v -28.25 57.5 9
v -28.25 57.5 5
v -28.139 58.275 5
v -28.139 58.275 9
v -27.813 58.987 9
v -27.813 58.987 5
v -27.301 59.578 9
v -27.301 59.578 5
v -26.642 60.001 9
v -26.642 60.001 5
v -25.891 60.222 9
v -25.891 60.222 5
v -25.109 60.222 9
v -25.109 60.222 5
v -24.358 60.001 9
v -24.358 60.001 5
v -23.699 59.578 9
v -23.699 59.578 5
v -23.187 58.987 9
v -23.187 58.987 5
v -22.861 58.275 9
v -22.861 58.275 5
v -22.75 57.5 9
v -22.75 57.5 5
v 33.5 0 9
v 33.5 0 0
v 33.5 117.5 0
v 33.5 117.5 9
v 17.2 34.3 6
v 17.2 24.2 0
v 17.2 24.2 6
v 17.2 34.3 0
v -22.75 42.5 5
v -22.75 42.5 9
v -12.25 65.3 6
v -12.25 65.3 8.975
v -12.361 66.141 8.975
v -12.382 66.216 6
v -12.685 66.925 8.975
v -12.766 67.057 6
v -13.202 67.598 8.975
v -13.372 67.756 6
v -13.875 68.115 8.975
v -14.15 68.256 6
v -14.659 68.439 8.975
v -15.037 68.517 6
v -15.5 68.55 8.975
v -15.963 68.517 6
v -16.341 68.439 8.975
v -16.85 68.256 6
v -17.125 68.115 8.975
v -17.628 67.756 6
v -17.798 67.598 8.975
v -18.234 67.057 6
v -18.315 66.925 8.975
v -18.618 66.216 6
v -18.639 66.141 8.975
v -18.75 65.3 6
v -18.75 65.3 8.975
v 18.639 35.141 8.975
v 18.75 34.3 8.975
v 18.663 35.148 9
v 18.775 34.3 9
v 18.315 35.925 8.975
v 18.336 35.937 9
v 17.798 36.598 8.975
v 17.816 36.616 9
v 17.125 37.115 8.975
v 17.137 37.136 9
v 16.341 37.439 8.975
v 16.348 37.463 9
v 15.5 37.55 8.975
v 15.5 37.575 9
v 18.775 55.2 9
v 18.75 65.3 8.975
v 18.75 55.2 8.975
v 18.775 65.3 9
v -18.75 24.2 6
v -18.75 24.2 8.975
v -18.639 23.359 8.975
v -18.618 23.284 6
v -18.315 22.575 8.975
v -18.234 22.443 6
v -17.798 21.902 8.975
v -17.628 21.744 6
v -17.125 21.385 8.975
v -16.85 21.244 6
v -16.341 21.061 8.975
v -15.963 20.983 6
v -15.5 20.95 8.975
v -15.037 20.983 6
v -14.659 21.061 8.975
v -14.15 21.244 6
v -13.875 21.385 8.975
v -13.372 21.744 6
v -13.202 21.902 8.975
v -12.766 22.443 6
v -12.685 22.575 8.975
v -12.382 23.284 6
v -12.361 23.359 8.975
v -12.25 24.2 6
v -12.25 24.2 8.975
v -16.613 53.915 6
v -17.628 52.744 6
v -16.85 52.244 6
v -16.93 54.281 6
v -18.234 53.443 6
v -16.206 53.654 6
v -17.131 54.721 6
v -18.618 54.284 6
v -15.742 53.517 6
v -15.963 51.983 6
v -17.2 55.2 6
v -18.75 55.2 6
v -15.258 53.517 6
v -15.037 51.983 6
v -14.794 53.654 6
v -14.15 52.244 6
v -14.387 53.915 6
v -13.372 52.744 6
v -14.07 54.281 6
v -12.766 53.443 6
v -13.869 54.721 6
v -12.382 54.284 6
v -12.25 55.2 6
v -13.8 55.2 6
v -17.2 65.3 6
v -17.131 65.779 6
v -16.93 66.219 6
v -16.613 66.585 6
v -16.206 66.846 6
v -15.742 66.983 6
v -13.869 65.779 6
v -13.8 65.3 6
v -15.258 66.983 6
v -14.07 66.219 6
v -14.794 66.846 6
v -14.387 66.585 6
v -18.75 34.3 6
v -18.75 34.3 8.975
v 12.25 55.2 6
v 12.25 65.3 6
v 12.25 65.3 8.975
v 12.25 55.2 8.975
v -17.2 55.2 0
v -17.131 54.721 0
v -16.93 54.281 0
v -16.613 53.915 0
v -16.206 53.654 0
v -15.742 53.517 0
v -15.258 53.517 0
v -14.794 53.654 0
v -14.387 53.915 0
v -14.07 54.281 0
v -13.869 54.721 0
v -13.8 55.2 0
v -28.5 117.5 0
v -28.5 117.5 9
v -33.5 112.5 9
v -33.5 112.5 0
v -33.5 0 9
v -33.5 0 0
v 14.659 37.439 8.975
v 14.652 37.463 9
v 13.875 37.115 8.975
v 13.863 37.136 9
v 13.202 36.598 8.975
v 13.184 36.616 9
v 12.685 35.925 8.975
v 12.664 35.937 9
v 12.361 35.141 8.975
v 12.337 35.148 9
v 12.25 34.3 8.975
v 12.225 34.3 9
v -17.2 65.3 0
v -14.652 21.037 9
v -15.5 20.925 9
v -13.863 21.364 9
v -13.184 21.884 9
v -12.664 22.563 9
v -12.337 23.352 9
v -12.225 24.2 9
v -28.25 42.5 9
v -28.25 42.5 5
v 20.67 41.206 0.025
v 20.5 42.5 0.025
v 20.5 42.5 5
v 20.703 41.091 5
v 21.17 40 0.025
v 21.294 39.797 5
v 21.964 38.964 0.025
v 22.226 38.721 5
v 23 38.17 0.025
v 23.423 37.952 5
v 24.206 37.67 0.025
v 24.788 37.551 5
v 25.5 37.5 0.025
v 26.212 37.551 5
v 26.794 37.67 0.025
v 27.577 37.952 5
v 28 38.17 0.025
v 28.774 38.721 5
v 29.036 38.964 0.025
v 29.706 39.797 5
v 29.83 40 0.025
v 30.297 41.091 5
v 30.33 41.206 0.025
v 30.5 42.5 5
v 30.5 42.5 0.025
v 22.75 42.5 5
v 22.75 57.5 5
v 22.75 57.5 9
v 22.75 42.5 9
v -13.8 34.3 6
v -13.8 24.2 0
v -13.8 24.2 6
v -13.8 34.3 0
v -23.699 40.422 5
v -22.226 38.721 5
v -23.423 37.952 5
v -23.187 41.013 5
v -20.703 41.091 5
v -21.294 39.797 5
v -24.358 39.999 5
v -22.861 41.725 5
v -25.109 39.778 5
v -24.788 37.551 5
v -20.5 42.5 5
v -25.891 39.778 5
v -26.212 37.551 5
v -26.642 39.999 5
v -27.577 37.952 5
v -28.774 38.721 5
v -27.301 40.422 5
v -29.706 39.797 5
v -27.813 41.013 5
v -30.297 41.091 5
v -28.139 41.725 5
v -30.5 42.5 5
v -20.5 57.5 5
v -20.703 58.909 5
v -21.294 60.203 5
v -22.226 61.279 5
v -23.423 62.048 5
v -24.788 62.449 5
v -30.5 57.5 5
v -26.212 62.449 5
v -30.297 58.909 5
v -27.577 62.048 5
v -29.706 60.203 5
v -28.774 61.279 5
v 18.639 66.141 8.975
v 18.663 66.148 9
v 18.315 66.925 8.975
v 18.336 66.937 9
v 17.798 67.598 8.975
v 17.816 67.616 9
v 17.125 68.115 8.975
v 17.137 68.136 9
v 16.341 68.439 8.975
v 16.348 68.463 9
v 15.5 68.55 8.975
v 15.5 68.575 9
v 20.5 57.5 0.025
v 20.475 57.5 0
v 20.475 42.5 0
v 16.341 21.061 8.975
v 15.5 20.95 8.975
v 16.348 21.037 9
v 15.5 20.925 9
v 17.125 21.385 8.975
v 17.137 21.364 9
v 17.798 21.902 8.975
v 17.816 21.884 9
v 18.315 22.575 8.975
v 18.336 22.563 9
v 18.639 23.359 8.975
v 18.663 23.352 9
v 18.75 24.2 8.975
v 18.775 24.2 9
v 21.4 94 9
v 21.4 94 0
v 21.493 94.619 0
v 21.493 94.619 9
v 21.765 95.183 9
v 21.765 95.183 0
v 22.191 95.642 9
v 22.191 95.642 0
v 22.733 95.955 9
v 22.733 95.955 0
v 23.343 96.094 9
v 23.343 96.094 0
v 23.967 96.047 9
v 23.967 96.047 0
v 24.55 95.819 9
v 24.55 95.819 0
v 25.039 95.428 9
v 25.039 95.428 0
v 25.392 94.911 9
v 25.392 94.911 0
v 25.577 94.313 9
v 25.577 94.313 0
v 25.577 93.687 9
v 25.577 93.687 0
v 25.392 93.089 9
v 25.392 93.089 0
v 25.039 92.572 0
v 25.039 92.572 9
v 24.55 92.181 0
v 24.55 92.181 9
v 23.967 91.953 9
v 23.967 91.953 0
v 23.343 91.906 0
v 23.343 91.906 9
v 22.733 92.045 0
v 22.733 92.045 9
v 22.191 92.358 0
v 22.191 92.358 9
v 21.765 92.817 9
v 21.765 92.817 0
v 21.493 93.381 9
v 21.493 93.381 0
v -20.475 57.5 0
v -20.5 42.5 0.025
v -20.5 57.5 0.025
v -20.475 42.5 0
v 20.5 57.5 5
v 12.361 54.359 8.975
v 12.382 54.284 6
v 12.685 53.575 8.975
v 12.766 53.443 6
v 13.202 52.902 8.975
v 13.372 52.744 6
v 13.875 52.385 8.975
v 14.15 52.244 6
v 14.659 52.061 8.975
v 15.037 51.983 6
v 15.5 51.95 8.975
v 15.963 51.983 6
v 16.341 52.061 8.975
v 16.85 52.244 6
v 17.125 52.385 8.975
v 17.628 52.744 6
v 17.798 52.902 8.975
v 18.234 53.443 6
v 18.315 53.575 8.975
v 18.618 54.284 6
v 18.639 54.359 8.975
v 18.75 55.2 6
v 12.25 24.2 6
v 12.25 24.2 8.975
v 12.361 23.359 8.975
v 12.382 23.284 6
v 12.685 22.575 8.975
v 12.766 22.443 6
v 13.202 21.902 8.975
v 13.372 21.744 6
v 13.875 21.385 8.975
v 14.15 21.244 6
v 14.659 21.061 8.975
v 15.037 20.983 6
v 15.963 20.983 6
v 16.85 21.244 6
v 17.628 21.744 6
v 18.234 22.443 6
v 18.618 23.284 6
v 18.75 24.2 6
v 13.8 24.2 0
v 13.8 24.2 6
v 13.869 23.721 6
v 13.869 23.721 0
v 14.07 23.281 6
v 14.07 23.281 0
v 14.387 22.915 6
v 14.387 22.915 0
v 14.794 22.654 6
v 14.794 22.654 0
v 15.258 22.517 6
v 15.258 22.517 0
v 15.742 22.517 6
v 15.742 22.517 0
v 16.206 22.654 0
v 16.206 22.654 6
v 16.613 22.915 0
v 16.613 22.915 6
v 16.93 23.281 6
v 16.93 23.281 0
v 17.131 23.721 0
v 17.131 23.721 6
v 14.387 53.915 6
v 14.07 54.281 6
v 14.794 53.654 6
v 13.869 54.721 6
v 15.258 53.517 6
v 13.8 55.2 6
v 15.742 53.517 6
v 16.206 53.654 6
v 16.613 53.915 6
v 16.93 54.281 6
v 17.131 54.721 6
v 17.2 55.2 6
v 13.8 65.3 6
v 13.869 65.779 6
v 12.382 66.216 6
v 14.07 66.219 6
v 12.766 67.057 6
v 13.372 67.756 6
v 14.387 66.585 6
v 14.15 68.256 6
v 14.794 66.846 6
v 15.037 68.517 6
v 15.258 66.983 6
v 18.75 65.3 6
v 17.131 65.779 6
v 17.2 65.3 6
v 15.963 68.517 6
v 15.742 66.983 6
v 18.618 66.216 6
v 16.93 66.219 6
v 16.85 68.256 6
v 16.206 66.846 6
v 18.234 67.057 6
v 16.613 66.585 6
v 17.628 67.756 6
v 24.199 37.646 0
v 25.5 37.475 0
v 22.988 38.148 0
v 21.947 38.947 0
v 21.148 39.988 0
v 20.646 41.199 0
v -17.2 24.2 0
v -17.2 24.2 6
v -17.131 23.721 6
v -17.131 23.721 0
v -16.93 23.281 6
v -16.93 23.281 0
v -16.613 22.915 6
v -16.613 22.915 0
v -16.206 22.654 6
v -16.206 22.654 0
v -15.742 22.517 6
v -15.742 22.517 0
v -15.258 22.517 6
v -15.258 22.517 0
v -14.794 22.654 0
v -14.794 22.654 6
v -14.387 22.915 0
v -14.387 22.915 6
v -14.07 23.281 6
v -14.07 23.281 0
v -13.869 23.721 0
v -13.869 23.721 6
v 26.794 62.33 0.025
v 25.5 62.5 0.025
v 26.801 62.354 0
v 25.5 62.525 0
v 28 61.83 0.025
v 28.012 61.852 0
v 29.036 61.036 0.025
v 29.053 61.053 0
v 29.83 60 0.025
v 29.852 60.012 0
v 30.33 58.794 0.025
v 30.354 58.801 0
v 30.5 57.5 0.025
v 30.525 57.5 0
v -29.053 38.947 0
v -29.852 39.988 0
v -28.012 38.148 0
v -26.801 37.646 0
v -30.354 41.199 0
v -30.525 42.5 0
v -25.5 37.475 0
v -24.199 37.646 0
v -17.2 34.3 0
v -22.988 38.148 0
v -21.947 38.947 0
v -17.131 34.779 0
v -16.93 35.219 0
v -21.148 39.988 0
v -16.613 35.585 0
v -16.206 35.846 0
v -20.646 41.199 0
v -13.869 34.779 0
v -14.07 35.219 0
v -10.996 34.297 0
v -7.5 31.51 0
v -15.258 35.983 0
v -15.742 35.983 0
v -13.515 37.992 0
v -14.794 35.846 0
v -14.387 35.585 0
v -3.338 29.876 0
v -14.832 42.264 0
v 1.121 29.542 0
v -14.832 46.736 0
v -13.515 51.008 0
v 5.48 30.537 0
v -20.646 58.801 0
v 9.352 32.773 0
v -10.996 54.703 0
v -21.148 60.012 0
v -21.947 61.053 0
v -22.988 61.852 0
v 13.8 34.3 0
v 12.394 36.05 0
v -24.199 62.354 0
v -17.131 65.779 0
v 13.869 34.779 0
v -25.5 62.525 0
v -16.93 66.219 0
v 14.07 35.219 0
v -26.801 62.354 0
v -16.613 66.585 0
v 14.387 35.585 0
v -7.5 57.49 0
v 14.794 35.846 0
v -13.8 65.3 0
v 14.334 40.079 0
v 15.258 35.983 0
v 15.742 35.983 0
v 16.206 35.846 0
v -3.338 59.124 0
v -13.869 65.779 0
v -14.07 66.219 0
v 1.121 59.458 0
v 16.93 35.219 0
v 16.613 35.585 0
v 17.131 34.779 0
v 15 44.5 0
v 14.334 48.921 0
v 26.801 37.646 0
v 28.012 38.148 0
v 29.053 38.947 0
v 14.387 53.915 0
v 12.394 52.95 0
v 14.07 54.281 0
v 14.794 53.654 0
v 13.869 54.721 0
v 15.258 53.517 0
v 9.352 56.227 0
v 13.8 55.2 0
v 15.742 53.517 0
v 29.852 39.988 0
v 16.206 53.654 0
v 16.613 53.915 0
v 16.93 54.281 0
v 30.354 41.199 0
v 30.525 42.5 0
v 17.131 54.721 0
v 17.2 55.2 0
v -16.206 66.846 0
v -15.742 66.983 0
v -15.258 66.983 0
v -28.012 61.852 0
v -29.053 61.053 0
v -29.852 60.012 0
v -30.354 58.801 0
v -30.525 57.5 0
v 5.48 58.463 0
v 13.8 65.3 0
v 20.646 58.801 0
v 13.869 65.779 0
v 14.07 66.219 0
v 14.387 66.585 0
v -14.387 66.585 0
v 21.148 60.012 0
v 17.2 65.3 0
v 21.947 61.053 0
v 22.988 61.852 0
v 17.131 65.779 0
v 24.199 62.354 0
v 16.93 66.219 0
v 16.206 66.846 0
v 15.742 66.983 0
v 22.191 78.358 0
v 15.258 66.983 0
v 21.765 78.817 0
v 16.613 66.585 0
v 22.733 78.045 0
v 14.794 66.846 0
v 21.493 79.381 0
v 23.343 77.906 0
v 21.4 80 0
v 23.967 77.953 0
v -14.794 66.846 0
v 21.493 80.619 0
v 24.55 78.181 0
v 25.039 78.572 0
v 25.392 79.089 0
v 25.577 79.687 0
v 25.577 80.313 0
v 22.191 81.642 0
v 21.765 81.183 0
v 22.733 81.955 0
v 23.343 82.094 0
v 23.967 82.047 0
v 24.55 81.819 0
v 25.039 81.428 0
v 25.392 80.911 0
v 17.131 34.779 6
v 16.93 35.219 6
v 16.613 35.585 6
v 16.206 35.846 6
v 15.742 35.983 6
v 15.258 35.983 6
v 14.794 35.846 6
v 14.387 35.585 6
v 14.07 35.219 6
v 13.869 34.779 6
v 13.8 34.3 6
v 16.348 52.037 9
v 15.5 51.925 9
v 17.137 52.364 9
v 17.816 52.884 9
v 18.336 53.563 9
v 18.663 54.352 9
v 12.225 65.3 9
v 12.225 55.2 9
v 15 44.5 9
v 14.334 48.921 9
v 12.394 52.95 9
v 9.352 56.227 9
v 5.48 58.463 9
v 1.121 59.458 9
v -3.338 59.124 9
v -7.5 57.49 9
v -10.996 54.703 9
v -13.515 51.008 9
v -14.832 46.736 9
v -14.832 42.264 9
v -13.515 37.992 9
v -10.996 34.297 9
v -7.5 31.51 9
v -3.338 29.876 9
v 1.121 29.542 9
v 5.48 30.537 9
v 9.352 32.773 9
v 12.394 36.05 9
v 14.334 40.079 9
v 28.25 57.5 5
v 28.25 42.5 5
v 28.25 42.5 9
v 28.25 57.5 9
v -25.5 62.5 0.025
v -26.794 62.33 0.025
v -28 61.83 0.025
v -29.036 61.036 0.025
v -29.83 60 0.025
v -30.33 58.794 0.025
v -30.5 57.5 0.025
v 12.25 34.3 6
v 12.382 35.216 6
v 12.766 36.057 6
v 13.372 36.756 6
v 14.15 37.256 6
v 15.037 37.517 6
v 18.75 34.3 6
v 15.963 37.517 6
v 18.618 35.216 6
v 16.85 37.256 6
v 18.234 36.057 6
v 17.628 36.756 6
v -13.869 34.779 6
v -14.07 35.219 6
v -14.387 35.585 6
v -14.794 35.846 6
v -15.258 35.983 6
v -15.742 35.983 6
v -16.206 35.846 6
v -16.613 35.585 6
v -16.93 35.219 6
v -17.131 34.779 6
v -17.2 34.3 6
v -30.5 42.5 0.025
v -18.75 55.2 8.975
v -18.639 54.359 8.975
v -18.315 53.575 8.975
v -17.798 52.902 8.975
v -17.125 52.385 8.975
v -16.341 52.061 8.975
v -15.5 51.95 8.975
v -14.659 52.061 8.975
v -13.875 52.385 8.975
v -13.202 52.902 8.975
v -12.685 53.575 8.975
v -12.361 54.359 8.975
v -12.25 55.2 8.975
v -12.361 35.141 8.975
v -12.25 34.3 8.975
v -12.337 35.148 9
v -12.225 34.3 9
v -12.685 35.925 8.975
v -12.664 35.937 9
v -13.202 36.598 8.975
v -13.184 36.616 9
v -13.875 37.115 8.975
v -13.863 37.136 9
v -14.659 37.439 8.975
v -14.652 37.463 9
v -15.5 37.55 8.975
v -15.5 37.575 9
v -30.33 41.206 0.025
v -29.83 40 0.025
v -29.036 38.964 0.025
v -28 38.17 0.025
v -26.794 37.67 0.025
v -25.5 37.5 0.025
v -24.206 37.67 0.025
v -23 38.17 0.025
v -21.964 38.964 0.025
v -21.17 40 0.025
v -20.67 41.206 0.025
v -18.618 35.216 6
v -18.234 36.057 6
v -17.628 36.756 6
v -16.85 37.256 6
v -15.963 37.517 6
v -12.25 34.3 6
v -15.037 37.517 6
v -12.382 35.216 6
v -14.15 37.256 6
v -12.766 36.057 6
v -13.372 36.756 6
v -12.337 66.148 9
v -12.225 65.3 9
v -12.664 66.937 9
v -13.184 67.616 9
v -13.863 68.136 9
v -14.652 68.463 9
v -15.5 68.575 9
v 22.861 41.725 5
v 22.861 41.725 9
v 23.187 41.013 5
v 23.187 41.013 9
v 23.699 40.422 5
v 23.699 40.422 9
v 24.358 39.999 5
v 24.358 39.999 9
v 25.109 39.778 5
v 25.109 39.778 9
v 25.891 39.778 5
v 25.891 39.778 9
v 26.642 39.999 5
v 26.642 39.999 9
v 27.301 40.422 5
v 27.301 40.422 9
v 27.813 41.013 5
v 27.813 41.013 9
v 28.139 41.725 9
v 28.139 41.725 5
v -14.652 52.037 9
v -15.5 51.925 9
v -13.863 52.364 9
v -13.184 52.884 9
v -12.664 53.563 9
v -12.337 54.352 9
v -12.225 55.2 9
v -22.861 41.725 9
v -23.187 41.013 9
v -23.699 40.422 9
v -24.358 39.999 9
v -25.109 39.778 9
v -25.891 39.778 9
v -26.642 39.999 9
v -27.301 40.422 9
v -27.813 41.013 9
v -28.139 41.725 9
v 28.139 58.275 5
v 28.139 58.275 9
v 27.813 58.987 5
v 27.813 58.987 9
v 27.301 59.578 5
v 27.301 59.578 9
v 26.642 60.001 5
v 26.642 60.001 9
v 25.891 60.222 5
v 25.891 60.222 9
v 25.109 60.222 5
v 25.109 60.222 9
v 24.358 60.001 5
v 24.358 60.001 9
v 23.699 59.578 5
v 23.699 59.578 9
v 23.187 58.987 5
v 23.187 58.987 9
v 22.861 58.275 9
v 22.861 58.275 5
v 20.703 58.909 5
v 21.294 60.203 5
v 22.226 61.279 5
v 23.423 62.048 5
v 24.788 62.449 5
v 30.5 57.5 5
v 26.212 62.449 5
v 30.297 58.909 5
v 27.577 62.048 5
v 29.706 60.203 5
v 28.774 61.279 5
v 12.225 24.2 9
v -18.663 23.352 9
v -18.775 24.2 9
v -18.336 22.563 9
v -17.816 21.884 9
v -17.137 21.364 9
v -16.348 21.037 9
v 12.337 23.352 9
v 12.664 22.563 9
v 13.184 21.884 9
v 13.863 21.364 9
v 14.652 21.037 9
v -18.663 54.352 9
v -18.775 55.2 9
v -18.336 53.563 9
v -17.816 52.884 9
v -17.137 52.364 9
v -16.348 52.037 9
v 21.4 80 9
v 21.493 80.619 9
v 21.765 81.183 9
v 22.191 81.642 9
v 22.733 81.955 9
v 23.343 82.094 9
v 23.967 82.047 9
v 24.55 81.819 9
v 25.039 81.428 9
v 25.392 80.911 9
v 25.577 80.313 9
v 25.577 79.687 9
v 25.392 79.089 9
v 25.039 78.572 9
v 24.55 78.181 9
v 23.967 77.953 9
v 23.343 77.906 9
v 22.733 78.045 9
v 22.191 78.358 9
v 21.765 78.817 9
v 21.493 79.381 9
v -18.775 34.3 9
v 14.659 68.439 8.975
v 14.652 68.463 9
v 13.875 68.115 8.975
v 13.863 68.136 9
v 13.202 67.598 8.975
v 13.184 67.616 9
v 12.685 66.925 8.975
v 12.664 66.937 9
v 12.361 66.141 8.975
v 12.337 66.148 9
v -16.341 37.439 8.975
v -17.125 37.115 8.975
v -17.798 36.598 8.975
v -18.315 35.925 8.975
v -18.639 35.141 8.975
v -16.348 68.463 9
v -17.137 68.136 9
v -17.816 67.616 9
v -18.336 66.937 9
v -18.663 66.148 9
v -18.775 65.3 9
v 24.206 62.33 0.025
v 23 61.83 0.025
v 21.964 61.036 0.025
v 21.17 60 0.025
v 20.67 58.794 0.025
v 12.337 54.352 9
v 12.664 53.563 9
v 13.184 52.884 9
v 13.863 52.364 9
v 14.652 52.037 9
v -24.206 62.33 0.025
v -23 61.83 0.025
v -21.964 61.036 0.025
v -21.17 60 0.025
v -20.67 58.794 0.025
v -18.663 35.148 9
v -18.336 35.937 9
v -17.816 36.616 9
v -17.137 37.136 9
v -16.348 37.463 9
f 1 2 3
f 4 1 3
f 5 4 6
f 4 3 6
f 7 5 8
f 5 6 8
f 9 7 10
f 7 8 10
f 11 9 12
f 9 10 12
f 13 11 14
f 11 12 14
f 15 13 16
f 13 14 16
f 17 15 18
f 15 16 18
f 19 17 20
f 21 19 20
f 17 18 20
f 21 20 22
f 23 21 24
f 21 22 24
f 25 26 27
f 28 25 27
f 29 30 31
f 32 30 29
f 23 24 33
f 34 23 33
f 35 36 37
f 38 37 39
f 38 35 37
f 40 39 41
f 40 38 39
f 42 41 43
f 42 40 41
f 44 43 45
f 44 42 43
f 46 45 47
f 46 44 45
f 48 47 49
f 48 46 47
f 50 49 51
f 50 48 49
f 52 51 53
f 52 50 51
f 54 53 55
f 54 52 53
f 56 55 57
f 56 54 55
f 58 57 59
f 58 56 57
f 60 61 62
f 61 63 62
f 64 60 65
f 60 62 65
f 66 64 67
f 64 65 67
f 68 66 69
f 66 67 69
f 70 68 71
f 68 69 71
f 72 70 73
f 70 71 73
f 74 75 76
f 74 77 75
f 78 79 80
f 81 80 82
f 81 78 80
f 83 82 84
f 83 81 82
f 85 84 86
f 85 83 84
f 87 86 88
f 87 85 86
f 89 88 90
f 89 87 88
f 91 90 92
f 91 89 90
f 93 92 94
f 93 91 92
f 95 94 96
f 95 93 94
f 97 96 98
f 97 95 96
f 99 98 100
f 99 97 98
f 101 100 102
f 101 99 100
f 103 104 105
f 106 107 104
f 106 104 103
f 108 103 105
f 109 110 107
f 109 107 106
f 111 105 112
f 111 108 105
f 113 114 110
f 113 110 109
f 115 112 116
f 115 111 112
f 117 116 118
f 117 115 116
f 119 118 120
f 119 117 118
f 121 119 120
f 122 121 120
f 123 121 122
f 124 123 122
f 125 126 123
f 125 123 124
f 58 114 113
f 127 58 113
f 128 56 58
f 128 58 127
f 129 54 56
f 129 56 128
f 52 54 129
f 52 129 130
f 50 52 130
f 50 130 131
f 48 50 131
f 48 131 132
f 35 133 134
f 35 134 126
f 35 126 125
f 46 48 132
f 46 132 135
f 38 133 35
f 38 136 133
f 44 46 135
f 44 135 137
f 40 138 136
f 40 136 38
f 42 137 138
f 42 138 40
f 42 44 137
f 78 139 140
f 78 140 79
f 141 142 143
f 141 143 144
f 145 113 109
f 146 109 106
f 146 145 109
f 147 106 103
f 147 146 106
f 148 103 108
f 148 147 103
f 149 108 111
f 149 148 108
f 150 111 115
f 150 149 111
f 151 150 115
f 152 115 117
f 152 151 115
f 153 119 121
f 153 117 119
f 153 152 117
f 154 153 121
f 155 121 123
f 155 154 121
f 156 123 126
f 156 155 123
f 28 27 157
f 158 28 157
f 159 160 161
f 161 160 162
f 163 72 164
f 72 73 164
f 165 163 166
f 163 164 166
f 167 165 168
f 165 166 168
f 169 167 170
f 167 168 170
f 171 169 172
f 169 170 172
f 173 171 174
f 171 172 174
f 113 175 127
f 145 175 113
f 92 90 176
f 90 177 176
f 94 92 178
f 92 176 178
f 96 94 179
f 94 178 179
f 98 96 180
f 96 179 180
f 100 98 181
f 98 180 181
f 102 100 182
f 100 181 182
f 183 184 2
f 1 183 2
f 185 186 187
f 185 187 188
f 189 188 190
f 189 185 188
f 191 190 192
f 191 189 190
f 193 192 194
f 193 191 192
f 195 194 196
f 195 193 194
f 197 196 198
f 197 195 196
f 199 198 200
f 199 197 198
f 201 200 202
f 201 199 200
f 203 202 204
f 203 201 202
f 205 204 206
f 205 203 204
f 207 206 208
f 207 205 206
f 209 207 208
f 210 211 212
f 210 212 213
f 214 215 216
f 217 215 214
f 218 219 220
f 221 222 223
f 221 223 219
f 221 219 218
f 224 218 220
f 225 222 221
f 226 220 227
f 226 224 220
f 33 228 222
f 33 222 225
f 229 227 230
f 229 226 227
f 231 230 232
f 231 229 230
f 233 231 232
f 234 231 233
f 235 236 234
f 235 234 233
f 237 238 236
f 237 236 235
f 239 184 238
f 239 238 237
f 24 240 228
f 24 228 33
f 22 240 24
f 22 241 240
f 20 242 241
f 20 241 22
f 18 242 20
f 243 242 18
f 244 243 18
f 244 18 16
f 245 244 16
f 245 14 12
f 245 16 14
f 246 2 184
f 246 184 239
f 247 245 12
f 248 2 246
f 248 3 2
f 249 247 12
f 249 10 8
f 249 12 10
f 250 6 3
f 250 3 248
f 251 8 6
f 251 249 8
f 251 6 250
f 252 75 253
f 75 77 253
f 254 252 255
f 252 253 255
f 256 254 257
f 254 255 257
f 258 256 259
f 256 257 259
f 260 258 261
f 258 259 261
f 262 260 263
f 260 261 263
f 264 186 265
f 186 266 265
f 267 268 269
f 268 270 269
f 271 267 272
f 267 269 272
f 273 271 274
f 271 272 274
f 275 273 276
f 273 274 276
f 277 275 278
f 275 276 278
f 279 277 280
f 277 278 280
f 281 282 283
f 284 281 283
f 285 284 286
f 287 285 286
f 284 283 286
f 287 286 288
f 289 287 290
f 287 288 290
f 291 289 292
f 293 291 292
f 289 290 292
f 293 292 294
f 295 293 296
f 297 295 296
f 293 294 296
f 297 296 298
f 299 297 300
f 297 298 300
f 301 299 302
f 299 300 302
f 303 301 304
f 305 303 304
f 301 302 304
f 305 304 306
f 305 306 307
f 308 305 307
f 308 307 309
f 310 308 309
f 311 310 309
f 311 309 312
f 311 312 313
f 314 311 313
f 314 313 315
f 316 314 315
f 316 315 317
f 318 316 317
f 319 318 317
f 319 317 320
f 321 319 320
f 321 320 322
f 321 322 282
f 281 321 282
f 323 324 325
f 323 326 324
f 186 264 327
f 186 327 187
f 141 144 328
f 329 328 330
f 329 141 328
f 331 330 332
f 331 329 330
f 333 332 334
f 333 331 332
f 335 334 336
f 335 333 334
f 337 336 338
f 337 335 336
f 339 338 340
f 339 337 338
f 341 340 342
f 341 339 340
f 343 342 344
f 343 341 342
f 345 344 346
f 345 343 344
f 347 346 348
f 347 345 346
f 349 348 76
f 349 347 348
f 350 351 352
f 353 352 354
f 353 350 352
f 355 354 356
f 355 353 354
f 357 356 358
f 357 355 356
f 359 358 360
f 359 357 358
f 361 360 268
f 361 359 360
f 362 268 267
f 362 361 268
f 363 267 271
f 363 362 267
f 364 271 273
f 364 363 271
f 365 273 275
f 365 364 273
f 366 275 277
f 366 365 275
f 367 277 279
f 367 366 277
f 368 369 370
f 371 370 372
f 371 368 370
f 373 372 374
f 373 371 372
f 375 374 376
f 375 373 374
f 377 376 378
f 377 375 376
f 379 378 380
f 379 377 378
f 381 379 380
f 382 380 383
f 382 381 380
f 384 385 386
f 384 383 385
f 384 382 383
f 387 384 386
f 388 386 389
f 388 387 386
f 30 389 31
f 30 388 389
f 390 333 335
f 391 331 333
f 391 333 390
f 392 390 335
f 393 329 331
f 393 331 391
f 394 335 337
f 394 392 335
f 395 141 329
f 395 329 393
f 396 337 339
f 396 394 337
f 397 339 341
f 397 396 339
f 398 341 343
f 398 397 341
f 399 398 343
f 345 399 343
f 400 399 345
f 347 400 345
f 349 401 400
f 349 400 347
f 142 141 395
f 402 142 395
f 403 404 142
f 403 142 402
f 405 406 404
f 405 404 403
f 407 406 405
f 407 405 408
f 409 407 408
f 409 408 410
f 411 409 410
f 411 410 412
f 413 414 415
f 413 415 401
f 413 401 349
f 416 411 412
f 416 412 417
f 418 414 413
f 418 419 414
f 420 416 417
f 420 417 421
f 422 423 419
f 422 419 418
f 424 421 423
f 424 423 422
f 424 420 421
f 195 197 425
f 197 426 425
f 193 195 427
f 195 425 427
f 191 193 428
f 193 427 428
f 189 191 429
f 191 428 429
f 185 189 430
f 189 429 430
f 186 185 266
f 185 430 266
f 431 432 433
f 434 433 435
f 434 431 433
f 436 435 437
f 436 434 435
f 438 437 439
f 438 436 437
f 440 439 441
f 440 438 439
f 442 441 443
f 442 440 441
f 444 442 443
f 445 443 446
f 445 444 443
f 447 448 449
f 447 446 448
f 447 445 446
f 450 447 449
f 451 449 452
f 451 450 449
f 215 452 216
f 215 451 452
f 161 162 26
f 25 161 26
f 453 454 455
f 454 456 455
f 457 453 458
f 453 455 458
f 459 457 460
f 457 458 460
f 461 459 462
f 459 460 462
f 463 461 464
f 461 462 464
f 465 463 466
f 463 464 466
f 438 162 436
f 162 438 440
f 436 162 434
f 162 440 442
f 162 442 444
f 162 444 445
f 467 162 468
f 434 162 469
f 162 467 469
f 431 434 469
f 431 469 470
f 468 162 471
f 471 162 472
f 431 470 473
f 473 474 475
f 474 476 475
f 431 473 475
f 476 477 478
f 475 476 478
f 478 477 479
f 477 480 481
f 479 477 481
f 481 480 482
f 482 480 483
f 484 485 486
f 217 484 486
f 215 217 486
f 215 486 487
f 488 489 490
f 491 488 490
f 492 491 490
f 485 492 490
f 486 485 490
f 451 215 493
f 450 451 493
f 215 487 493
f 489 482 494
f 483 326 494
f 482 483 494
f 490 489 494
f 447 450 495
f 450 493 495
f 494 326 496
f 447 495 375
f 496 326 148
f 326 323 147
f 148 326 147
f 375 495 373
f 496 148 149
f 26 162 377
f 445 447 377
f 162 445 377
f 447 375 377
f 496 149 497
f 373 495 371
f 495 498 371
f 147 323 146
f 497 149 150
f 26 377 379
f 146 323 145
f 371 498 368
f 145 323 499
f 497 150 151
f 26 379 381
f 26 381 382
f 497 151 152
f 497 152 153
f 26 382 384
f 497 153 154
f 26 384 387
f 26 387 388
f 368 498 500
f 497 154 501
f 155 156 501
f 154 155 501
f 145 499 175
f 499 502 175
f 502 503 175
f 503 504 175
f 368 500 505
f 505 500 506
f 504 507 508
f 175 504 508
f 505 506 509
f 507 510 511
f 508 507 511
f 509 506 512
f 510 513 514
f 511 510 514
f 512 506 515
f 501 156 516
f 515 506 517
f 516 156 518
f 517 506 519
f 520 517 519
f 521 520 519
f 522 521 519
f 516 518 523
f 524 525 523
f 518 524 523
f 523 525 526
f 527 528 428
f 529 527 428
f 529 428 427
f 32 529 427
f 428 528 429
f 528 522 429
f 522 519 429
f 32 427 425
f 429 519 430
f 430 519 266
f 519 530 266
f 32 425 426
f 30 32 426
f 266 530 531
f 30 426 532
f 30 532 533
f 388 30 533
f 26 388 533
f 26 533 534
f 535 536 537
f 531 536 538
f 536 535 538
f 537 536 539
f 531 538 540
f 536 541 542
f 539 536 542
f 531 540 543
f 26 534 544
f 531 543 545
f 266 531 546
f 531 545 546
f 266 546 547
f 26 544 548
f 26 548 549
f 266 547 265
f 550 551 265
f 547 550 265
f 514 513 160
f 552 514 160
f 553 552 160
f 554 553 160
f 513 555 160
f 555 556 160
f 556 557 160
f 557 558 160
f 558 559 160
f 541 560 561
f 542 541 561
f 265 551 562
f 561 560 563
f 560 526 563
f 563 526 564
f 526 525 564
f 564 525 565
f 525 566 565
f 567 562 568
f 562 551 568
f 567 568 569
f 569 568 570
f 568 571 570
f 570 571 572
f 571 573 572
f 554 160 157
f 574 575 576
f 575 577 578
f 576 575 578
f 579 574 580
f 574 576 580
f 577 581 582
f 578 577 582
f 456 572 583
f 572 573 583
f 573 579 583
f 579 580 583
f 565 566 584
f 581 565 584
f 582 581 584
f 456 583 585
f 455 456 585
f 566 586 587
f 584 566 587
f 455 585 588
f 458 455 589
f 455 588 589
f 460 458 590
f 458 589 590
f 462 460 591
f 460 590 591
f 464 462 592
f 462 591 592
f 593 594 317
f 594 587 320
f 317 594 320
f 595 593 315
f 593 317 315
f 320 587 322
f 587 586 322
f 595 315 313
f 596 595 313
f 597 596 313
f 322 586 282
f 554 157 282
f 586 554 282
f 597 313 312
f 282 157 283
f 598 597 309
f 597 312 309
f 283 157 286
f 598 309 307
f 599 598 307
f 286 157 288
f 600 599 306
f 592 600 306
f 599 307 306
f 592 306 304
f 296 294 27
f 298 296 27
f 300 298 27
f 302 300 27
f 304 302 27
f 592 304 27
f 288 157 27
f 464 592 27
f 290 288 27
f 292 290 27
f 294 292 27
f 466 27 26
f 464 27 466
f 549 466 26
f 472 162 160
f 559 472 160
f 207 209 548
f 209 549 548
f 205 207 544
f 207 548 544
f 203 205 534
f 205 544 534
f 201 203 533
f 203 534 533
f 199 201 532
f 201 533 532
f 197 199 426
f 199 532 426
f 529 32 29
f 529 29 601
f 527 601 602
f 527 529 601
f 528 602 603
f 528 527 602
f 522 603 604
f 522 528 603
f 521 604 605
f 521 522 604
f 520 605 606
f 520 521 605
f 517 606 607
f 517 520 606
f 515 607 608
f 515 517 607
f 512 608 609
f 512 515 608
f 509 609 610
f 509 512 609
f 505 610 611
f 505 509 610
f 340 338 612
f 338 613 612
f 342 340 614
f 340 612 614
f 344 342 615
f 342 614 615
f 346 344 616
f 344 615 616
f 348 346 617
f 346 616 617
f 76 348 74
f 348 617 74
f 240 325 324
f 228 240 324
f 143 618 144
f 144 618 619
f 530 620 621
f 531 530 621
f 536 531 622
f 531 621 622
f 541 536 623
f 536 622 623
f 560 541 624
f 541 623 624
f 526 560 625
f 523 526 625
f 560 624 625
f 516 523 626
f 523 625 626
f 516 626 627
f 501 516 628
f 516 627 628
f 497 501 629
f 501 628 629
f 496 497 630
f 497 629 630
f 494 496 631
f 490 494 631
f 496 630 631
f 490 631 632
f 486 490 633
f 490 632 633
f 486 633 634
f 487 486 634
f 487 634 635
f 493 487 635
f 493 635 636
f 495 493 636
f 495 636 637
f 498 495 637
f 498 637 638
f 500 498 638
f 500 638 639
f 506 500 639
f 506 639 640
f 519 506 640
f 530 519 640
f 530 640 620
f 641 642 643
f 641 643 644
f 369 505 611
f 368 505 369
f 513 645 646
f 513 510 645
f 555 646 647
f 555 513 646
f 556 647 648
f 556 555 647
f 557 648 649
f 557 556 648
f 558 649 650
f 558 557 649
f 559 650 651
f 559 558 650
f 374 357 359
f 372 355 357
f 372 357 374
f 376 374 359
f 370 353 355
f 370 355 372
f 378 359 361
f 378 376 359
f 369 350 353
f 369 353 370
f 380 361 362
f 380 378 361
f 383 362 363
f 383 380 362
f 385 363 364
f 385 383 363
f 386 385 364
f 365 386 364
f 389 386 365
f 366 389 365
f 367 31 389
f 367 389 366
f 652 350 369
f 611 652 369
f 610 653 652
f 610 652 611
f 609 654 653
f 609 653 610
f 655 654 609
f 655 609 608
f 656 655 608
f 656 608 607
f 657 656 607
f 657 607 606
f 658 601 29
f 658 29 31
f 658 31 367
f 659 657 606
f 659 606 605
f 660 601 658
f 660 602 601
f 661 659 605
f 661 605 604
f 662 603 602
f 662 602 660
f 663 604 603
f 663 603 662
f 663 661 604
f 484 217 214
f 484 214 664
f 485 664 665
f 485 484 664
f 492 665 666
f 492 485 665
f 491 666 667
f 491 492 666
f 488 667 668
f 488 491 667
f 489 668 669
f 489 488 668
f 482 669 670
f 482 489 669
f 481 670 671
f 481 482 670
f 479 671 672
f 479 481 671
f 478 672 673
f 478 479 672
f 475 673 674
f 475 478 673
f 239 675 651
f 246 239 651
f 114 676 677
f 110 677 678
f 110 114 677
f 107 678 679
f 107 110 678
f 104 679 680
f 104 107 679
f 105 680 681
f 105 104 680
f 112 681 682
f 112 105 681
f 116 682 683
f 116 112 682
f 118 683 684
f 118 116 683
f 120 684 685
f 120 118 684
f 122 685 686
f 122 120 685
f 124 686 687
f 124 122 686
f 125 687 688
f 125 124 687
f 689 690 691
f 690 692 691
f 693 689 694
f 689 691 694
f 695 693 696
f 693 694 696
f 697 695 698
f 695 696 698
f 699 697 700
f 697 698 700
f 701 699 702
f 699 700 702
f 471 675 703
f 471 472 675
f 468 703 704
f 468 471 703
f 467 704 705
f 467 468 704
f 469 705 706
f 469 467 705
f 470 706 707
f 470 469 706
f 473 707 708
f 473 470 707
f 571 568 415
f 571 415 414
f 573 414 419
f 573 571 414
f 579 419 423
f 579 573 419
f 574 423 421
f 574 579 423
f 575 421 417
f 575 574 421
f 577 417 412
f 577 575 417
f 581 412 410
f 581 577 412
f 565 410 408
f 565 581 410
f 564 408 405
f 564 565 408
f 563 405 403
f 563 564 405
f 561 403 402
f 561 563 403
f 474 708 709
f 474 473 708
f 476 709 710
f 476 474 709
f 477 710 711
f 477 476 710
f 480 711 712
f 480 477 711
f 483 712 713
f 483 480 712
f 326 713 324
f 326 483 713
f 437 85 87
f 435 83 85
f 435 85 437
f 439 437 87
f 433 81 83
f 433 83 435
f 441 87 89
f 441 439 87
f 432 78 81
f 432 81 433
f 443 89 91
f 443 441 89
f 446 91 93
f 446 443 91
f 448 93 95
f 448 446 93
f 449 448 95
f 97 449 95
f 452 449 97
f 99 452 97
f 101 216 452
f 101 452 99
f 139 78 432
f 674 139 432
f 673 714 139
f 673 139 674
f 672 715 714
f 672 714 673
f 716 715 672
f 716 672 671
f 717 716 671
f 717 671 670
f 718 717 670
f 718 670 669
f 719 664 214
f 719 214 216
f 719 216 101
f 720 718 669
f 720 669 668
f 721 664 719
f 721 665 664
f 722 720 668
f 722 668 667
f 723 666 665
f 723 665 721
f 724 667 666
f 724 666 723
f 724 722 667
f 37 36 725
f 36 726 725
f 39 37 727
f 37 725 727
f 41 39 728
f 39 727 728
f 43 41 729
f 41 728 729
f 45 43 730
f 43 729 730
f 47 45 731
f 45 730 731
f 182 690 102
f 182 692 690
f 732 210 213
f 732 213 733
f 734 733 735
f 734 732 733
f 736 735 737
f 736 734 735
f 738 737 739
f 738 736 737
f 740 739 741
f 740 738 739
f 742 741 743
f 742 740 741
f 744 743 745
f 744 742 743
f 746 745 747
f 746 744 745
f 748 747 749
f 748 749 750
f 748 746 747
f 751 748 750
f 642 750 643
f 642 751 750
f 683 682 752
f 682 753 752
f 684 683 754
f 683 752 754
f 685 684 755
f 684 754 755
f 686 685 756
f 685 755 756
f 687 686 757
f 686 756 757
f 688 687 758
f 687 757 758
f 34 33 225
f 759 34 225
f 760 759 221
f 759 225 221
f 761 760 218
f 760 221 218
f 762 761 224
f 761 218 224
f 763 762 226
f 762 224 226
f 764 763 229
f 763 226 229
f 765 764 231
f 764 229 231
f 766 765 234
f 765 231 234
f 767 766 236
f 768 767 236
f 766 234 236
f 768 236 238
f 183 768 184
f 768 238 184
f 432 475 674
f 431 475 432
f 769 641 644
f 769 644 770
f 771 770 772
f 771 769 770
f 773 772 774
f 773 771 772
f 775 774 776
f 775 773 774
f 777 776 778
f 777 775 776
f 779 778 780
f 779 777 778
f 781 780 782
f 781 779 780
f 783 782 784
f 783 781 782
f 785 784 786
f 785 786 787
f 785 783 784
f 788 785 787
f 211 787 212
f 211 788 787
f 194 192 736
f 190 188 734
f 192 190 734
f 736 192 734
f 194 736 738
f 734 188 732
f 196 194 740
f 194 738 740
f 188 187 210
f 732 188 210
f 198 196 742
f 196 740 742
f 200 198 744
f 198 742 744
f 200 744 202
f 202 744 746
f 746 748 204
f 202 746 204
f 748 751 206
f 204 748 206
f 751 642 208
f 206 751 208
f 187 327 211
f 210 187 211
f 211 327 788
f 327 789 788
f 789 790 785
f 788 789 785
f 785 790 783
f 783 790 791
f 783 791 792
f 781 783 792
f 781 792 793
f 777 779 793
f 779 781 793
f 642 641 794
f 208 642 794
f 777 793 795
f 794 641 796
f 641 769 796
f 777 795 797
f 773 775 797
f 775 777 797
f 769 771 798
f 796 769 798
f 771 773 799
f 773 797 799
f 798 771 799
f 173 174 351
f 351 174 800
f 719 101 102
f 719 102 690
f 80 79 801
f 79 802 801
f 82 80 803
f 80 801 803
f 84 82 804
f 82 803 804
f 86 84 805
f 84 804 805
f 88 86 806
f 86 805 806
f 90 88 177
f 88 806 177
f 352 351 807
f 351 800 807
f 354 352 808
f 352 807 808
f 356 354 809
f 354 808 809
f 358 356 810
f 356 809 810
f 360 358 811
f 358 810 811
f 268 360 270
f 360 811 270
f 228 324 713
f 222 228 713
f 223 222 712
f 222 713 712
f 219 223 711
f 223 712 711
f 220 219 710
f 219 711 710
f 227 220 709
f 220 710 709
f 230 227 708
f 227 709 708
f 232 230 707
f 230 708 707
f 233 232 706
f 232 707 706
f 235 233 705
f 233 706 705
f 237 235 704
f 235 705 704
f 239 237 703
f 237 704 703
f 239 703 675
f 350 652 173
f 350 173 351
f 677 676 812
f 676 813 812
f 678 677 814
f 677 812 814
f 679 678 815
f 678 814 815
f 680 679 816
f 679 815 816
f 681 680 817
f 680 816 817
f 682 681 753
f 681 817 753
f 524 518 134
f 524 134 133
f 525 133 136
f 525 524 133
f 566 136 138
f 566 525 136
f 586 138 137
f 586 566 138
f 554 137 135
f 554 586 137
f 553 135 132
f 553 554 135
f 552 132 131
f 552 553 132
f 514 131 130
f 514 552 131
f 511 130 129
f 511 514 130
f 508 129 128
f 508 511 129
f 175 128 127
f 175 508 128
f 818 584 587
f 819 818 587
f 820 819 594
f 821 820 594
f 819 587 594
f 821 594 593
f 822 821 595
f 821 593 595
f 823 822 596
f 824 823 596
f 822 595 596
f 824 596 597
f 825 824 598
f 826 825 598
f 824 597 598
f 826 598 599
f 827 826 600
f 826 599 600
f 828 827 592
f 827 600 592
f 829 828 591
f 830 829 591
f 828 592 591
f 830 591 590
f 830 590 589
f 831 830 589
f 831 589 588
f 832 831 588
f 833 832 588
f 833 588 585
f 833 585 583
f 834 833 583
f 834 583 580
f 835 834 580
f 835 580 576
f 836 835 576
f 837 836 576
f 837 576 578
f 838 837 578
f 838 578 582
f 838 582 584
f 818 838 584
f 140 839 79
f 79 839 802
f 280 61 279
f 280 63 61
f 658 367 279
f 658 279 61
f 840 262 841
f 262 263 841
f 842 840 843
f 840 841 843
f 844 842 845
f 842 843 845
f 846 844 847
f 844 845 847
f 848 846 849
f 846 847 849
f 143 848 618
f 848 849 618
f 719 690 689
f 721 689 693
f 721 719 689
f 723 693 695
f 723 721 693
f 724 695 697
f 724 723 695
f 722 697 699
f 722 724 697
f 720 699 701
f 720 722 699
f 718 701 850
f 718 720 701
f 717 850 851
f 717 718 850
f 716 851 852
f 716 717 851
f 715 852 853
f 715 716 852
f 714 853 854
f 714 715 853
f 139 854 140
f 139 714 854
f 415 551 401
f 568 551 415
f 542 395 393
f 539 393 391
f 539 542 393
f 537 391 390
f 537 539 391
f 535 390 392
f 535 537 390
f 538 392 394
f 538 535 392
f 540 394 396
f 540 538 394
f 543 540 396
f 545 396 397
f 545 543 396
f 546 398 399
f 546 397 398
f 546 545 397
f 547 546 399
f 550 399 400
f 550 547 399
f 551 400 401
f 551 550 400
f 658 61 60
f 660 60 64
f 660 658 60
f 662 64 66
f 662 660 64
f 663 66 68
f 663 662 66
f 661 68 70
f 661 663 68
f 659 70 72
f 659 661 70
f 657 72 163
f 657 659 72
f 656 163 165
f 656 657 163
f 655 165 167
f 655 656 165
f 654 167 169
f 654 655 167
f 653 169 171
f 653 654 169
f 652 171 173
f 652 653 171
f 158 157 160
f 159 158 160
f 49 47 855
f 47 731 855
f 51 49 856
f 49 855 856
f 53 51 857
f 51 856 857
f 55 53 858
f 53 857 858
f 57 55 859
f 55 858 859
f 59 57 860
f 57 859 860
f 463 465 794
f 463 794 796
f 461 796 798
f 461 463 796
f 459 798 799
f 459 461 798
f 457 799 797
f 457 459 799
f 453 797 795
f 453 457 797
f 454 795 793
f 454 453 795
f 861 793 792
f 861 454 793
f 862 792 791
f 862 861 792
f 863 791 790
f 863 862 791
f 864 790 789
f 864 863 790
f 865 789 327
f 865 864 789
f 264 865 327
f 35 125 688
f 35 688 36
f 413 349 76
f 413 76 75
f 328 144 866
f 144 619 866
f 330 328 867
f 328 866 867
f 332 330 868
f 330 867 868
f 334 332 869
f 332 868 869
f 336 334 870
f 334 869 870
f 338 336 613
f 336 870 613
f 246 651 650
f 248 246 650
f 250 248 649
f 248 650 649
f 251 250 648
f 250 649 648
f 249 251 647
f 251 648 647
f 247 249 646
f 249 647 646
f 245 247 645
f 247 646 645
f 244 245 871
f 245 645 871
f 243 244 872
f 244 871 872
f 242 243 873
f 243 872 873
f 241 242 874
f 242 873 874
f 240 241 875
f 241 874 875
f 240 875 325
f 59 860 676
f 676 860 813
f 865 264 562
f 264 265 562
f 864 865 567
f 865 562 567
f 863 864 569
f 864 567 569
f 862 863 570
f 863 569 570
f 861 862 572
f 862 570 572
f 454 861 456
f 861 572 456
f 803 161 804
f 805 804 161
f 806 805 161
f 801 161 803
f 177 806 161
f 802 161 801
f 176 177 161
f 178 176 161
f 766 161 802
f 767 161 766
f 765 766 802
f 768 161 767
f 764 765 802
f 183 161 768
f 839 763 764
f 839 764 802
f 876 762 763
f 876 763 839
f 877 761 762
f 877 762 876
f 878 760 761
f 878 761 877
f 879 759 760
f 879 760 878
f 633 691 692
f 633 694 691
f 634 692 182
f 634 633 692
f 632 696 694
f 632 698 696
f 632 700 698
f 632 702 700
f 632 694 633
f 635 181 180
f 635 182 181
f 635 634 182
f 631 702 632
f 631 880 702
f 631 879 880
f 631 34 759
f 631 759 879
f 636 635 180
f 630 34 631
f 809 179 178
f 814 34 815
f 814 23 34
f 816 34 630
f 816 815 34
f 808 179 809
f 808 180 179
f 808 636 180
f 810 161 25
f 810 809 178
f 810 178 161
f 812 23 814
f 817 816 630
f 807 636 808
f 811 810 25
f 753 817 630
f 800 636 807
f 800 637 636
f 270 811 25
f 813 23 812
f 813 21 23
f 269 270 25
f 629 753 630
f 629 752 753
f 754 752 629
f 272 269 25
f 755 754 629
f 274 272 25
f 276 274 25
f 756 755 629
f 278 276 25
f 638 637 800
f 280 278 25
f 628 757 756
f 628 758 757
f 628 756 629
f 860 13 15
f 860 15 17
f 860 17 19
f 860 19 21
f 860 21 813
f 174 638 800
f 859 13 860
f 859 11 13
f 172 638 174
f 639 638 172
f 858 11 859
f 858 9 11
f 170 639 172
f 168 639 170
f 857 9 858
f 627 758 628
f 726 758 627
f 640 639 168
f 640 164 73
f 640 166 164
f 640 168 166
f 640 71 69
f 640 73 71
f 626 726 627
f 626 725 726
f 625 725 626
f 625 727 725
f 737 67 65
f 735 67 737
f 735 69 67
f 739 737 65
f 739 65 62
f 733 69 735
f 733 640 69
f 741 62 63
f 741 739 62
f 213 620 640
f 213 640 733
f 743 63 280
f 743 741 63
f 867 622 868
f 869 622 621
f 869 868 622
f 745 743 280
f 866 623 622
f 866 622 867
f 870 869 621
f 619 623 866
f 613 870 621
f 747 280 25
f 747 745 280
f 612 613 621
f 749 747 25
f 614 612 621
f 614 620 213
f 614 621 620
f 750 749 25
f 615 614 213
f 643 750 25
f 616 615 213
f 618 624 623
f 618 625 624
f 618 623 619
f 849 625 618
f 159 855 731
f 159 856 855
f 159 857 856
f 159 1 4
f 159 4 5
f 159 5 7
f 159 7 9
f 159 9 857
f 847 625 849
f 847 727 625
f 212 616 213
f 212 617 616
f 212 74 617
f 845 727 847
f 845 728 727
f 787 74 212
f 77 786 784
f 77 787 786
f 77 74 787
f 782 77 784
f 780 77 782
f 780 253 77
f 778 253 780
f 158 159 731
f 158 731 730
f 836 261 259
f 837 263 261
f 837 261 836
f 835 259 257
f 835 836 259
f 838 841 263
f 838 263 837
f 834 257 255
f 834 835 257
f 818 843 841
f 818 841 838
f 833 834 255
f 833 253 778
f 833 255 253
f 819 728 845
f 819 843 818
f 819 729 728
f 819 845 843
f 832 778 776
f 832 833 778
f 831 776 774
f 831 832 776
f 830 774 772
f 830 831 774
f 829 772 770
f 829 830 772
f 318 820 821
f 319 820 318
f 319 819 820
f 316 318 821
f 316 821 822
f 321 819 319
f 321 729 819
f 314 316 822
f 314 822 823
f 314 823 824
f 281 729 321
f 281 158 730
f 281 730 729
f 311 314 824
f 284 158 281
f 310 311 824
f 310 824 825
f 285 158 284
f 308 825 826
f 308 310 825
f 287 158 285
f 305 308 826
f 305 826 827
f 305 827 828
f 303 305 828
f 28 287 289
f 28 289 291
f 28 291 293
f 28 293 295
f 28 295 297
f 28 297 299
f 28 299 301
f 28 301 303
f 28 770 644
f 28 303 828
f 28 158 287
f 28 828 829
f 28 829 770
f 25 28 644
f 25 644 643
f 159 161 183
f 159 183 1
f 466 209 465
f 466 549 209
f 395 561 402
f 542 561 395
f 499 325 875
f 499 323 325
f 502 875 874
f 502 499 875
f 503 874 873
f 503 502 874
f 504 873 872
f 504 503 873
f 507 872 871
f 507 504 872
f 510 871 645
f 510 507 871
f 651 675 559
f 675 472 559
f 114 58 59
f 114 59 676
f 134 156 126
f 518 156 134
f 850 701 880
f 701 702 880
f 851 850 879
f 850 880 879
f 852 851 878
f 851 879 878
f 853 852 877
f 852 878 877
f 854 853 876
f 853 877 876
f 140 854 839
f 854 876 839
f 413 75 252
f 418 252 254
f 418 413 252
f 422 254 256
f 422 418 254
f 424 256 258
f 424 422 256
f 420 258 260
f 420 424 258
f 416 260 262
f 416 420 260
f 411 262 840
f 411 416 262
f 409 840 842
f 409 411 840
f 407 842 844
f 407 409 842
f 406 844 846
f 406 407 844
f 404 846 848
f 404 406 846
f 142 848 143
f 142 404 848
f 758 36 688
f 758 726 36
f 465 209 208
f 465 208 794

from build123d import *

# Parameters (mm, degrees)
BOSS_EXTRUDE1_DEPTH             = 9
SKETCH2_R                       = 15
MOTOR_HOLE_DEPTH                = 123.513264588
CBORE_START                     = -1
CBORE_SLOT_FOR_M3_SHCS1_DEPTH   = 10
CBORE_START_2                   = 6
CBORE_SLOT_FOR_M3_SHCS1_2_DEPTH = 3
LPATTERN2_COUNT                 = 2
LPATTERN2_PITCH                 = 31
LPATTERN2_COUNT_DIR2            = 2
LPATTERN2_PITCH_DIR2            = 31
CBORE_SLOT_FOR_M5_SHCS1_DEPTH   = 5
CBORE_START_3                   = 5
CBORE_SLOT_FOR_M5_SHCS1_2_DEPTH = 4
M5X0_8_TAPPED_HOLE1_D           = 4.2


with BuildPart() as part:
    # Sketch1 → Boss-Extrude1 (new body)
    with BuildSketch(Plane.XY):
        Polygon((-33.5, 0), (33.5, 0), (33.5, 117.5), (-28.5, 117.5), (-33.5, 112.5), align=None)
    extrude(amount=BOSS_EXTRUDE1_DEPTH)

    # Sketch2 → Motor Hole (cut, through all)
    with BuildSketch(Plane.XY.offset(9)):
        with Locations((0, 44.5)):
            Circle(SKETCH2_R)
    extrude(amount=-MOTOR_HOLE_DEPTH, mode=Mode.SUBTRACT)

    # CBORE SLOT for M3 SHCS1: read off the stored shape, not the designer's step
    # CBORE SLOT for M3 SHCS1 outline → CBORE SLOT for M3 SHCS1 (cut)
    with BuildSketch(Plane.XY.offset(CBORE_START)):
        with BuildLine():
            Line((-13.8, 55.2), (-13.8, 65.3))
            ThreePointArc((-13.8, 65.3), (-15.5, 67), (-17.2, 65.3))
            Line((-17.2, 65.3), (-17.2, 55.2))
            ThreePointArc((-17.2, 55.2), (-15.5, 53.5), (-13.8, 55.2))
        make_face()
    cbore_slot_for_m3_shcs1 = extrude(amount=CBORE_SLOT_FOR_M3_SHCS1_DEPTH, mode=Mode.SUBTRACT)

    # CBORE SLOT for M3 SHCS1 2 outline → CBORE SLOT for M3 SHCS1 2 (cut)
    with BuildSketch(Plane.XY.offset(CBORE_START_2)):
        with BuildLine():
            Line((-12.25, 55.2), (-12.25, 65.3))
            ThreePointArc((-12.25, 65.3), (-15.5, 68.55), (-18.75, 65.3))
            Line((-18.75, 65.3), (-18.75, 55.2))
            ThreePointArc((-18.75, 55.2), (-15.5, 51.95), (-12.25, 55.2))
        make_face()
        with BuildLine():
            ThreePointArc((-17.2, 65.3), (-15.5, 67), (-13.8, 65.3))
            Line((-13.8, 65.3), (-13.8, 55.2))
            ThreePointArc((-13.8, 55.2), (-15.5, 53.5), (-17.2, 55.2))
            Line((-17.2, 55.2), (-17.2, 65.3))
        make_face(mode=Mode.SUBTRACT)
    cbore_slot_for_m3_shcs1_2 = extrude(amount=CBORE_SLOT_FOR_M3_SHCS1_2_DEPTH, mode=Mode.SUBTRACT)

    # CBORE SLOT for M3 SHCS1 3: loft between two sections, ruled curve by curve
    cbore_slot_for_m3_shcs1_3_from = [
        Edge.make_three_point_arc((-12.25, 65.3, 8.975), (-13.201902961, 67.598097039, 8.975), (-15.5, 68.55, 8.975)),
        Edge.make_three_point_arc((-15.5, 68.55, 8.975), (-17.798097039, 67.598097039, 8.975), (-18.75, 65.3, 8.975)),
        Edge.make_three_point_arc((-18.75, 55.2, 8.975), (-17.798097039, 52.901902961, 8.975), (-15.5, 51.95, 8.975)),
        Edge.make_three_point_arc((-15.5, 51.95, 8.975), (-13.201902961, 52.901902961, 8.975), (-12.25, 55.2, 8.975)),
        Edge.make_line((-18.75, 65.3, 8.975), (-18.75, 55.2, 8.975)),
        Edge.make_line((-12.25, 65.3, 8.975), (-12.25, 55.2, 8.975)),
    ]
    cbore_slot_for_m3_shcs1_3_to = [
        Edge.make_three_point_arc((-12.225, 65.3, 9), (-13.184225292, 67.615774708, 9), (-15.5, 68.575, 9)),
        Edge.make_three_point_arc((-15.5, 68.575, 9), (-17.815774708, 67.615774708, 9), (-18.775, 65.3, 9)),
        Edge.make_three_point_arc((-18.775, 55.2, 9), (-17.815774708, 52.884225292, 9), (-15.5, 51.925, 9)),
        Edge.make_three_point_arc((-15.5, 51.925, 9), (-13.184225292, 52.884225292, 9), (-12.225, 55.2, 9)),
        Edge.make_line((-18.775, 65.3, 9), (-18.775, 55.2, 9)),
        Edge.make_line((-12.225, 65.3, 9), (-12.225, 55.2, 9)),
    ]
    cbore_slot_for_m3_shcs1_3 = Solid(Shell([*[Face.make_surface_from_curves(cbore_slot_for_m3_shcs1_3_from[k], cbore_slot_for_m3_shcs1_3_to[k]) for k in range(6)], Face(Wire(cbore_slot_for_m3_shcs1_3_from)), Face(Wire(cbore_slot_for_m3_shcs1_3_to))]))
    add(cbore_slot_for_m3_shcs1_3, mode=Mode.SUBTRACT)

    # LPattern2: CBORE SLOT for M3 SHCS1, CBORE SLOT for M3 SHCS1 2, CBORE SLOT for M3 SHCS1 3 2 × 2
    with Locations(*[(i * LPATTERN2_PITCH, -j * LPATTERN2_PITCH_DIR2, 0) for i in range(LPATTERN2_COUNT) for j in range(LPATTERN2_COUNT_DIR2) if (i, j) != (0, 0)]):
        add(cbore_slot_for_m3_shcs1, mode=Mode.SUBTRACT)
        add(cbore_slot_for_m3_shcs1_2, mode=Mode.SUBTRACT)
        add(cbore_slot_for_m3_shcs1_3, mode=Mode.SUBTRACT)

    # CBORE SLOT for M5 SHCS1: read off the stored shape, not the designer's step
    # CBORE SLOT for M5 SHCS1 outline → CBORE SLOT for M5 SHCS1 (cut)
    with BuildSketch(Plane.XY):
        with BuildLine():
            ThreePointArc((20.5, 42.5), (25.5, 37.5), (30.5, 42.5))
            Line((30.5, 42.5), (30.5, 57.5))
            ThreePointArc((30.5, 57.5), (25.5, 62.5), (20.5, 57.5))
            Line((20.5, 57.5), (20.5, 42.5))
        make_face()
    cbore_slot_for_m5_shcs1 = extrude(amount=CBORE_SLOT_FOR_M5_SHCS1_DEPTH, mode=Mode.SUBTRACT)

    # CBORE SLOT for M5 SHCS1 2 outline → CBORE SLOT for M5 SHCS1 2 (cut)
    with BuildSketch(Plane.XY.offset(CBORE_START_3)):
        with BuildLine():
            ThreePointArc((22.75, 42.5), (25.5, 39.75), (28.25, 42.5))
            Line((28.25, 42.5), (28.25, 57.5))
            ThreePointArc((28.25, 57.5), (25.5, 60.25), (22.75, 57.5))
            Line((22.75, 57.5), (22.75, 42.5))
        make_face()
    cbore_slot_for_m5_shcs1_2 = extrude(amount=CBORE_SLOT_FOR_M5_SHCS1_2_DEPTH, mode=Mode.SUBTRACT)

    # CBORE SLOT for M5 SHCS1 3: loft between two sections, ruled curve by curve
    cbore_slot_for_m5_shcs1_3_from = [
        Edge.make_three_point_arc((30.5, 42.5, 0.025), (29.035533906, 38.964466094, 0.025), (25.5, 37.5, 0.025)),
        Edge.make_three_point_arc((25.5, 37.5, 0.025), (21.964466094, 38.964466094, 0.025), (20.5, 42.5, 0.025)),
        Edge.make_three_point_arc((20.5, 57.5, 0.025), (21.964466094, 61.035533906, 0.025), (25.5, 62.5, 0.025)),
        Edge.make_three_point_arc((25.5, 62.5, 0.025), (29.035533906, 61.035533906, 0.025), (30.5, 57.5, 0.025)),
        Edge.make_line((20.5, 42.5, 0.025), (20.5, 57.5, 0.025)),
        Edge.make_line((30.5, 42.5, 0.025), (30.5, 57.5, 0.025)),
    ]
    cbore_slot_for_m5_shcs1_3_to = [
        Edge.make_three_point_arc((30.525, 42.5, 0), (29.053211575, 38.946788425, 0), (25.5, 37.475, 0)),
        Edge.make_three_point_arc((25.5, 37.475, 0), (21.946788425, 38.946788425, 0), (20.475, 42.5, 0)),
        Edge.make_three_point_arc((20.475, 57.5, 0), (21.946788425, 61.053211575, 0), (25.5, 62.525, 0)),
        Edge.make_three_point_arc((25.5, 62.525, 0), (29.053211575, 61.053211575, 0), (30.525, 57.5, 0)),
        Edge.make_line((20.475, 42.5, 0), (20.475, 57.5, 0)),
        Edge.make_line((30.525, 42.5, 0), (30.525, 57.5, 0)),
    ]
    cbore_slot_for_m5_shcs1_3 = Solid(Shell([*[Face.make_surface_from_curves(cbore_slot_for_m5_shcs1_3_from[k], cbore_slot_for_m5_shcs1_3_to[k]) for k in range(6)], Face(Wire(cbore_slot_for_m5_shcs1_3_from)), Face(Wire(cbore_slot_for_m5_shcs1_3_to))]))
    add(cbore_slot_for_m5_shcs1_3, mode=Mode.SUBTRACT)

    # Mirror1: CBORE SLOT for M5 SHCS1, CBORE SLOT for M5 SHCS1 2, CBORE SLOT for M5 SHCS1 3 across plane
    add(cbore_slot_for_m5_shcs1.mirror(Plane(origin=(0, 0, 0), x_dir=(0, 0, 1), z_dir=(1, 0, 0))), mode=Mode.SUBTRACT)
    add(cbore_slot_for_m5_shcs1_2.mirror(Plane(origin=(0, 0, 0), x_dir=(0, 0, 1), z_dir=(1, 0, 0))), mode=Mode.SUBTRACT)
    add(cbore_slot_for_m5_shcs1_3.mirror(Plane(origin=(0, 0, 0), x_dir=(0, 0, 1), z_dir=(1, 0, 0))), mode=Mode.SUBTRACT)

    # M5x0.8 Tapped Hole1 (through all)
    with Locations(Plane.XY.offset(9)):
        with Locations((23.5, 94), (23.5, 80)):
            Hole(M5X0_8_TAPPED_HOLE1_D / 2)


solid = part.part
